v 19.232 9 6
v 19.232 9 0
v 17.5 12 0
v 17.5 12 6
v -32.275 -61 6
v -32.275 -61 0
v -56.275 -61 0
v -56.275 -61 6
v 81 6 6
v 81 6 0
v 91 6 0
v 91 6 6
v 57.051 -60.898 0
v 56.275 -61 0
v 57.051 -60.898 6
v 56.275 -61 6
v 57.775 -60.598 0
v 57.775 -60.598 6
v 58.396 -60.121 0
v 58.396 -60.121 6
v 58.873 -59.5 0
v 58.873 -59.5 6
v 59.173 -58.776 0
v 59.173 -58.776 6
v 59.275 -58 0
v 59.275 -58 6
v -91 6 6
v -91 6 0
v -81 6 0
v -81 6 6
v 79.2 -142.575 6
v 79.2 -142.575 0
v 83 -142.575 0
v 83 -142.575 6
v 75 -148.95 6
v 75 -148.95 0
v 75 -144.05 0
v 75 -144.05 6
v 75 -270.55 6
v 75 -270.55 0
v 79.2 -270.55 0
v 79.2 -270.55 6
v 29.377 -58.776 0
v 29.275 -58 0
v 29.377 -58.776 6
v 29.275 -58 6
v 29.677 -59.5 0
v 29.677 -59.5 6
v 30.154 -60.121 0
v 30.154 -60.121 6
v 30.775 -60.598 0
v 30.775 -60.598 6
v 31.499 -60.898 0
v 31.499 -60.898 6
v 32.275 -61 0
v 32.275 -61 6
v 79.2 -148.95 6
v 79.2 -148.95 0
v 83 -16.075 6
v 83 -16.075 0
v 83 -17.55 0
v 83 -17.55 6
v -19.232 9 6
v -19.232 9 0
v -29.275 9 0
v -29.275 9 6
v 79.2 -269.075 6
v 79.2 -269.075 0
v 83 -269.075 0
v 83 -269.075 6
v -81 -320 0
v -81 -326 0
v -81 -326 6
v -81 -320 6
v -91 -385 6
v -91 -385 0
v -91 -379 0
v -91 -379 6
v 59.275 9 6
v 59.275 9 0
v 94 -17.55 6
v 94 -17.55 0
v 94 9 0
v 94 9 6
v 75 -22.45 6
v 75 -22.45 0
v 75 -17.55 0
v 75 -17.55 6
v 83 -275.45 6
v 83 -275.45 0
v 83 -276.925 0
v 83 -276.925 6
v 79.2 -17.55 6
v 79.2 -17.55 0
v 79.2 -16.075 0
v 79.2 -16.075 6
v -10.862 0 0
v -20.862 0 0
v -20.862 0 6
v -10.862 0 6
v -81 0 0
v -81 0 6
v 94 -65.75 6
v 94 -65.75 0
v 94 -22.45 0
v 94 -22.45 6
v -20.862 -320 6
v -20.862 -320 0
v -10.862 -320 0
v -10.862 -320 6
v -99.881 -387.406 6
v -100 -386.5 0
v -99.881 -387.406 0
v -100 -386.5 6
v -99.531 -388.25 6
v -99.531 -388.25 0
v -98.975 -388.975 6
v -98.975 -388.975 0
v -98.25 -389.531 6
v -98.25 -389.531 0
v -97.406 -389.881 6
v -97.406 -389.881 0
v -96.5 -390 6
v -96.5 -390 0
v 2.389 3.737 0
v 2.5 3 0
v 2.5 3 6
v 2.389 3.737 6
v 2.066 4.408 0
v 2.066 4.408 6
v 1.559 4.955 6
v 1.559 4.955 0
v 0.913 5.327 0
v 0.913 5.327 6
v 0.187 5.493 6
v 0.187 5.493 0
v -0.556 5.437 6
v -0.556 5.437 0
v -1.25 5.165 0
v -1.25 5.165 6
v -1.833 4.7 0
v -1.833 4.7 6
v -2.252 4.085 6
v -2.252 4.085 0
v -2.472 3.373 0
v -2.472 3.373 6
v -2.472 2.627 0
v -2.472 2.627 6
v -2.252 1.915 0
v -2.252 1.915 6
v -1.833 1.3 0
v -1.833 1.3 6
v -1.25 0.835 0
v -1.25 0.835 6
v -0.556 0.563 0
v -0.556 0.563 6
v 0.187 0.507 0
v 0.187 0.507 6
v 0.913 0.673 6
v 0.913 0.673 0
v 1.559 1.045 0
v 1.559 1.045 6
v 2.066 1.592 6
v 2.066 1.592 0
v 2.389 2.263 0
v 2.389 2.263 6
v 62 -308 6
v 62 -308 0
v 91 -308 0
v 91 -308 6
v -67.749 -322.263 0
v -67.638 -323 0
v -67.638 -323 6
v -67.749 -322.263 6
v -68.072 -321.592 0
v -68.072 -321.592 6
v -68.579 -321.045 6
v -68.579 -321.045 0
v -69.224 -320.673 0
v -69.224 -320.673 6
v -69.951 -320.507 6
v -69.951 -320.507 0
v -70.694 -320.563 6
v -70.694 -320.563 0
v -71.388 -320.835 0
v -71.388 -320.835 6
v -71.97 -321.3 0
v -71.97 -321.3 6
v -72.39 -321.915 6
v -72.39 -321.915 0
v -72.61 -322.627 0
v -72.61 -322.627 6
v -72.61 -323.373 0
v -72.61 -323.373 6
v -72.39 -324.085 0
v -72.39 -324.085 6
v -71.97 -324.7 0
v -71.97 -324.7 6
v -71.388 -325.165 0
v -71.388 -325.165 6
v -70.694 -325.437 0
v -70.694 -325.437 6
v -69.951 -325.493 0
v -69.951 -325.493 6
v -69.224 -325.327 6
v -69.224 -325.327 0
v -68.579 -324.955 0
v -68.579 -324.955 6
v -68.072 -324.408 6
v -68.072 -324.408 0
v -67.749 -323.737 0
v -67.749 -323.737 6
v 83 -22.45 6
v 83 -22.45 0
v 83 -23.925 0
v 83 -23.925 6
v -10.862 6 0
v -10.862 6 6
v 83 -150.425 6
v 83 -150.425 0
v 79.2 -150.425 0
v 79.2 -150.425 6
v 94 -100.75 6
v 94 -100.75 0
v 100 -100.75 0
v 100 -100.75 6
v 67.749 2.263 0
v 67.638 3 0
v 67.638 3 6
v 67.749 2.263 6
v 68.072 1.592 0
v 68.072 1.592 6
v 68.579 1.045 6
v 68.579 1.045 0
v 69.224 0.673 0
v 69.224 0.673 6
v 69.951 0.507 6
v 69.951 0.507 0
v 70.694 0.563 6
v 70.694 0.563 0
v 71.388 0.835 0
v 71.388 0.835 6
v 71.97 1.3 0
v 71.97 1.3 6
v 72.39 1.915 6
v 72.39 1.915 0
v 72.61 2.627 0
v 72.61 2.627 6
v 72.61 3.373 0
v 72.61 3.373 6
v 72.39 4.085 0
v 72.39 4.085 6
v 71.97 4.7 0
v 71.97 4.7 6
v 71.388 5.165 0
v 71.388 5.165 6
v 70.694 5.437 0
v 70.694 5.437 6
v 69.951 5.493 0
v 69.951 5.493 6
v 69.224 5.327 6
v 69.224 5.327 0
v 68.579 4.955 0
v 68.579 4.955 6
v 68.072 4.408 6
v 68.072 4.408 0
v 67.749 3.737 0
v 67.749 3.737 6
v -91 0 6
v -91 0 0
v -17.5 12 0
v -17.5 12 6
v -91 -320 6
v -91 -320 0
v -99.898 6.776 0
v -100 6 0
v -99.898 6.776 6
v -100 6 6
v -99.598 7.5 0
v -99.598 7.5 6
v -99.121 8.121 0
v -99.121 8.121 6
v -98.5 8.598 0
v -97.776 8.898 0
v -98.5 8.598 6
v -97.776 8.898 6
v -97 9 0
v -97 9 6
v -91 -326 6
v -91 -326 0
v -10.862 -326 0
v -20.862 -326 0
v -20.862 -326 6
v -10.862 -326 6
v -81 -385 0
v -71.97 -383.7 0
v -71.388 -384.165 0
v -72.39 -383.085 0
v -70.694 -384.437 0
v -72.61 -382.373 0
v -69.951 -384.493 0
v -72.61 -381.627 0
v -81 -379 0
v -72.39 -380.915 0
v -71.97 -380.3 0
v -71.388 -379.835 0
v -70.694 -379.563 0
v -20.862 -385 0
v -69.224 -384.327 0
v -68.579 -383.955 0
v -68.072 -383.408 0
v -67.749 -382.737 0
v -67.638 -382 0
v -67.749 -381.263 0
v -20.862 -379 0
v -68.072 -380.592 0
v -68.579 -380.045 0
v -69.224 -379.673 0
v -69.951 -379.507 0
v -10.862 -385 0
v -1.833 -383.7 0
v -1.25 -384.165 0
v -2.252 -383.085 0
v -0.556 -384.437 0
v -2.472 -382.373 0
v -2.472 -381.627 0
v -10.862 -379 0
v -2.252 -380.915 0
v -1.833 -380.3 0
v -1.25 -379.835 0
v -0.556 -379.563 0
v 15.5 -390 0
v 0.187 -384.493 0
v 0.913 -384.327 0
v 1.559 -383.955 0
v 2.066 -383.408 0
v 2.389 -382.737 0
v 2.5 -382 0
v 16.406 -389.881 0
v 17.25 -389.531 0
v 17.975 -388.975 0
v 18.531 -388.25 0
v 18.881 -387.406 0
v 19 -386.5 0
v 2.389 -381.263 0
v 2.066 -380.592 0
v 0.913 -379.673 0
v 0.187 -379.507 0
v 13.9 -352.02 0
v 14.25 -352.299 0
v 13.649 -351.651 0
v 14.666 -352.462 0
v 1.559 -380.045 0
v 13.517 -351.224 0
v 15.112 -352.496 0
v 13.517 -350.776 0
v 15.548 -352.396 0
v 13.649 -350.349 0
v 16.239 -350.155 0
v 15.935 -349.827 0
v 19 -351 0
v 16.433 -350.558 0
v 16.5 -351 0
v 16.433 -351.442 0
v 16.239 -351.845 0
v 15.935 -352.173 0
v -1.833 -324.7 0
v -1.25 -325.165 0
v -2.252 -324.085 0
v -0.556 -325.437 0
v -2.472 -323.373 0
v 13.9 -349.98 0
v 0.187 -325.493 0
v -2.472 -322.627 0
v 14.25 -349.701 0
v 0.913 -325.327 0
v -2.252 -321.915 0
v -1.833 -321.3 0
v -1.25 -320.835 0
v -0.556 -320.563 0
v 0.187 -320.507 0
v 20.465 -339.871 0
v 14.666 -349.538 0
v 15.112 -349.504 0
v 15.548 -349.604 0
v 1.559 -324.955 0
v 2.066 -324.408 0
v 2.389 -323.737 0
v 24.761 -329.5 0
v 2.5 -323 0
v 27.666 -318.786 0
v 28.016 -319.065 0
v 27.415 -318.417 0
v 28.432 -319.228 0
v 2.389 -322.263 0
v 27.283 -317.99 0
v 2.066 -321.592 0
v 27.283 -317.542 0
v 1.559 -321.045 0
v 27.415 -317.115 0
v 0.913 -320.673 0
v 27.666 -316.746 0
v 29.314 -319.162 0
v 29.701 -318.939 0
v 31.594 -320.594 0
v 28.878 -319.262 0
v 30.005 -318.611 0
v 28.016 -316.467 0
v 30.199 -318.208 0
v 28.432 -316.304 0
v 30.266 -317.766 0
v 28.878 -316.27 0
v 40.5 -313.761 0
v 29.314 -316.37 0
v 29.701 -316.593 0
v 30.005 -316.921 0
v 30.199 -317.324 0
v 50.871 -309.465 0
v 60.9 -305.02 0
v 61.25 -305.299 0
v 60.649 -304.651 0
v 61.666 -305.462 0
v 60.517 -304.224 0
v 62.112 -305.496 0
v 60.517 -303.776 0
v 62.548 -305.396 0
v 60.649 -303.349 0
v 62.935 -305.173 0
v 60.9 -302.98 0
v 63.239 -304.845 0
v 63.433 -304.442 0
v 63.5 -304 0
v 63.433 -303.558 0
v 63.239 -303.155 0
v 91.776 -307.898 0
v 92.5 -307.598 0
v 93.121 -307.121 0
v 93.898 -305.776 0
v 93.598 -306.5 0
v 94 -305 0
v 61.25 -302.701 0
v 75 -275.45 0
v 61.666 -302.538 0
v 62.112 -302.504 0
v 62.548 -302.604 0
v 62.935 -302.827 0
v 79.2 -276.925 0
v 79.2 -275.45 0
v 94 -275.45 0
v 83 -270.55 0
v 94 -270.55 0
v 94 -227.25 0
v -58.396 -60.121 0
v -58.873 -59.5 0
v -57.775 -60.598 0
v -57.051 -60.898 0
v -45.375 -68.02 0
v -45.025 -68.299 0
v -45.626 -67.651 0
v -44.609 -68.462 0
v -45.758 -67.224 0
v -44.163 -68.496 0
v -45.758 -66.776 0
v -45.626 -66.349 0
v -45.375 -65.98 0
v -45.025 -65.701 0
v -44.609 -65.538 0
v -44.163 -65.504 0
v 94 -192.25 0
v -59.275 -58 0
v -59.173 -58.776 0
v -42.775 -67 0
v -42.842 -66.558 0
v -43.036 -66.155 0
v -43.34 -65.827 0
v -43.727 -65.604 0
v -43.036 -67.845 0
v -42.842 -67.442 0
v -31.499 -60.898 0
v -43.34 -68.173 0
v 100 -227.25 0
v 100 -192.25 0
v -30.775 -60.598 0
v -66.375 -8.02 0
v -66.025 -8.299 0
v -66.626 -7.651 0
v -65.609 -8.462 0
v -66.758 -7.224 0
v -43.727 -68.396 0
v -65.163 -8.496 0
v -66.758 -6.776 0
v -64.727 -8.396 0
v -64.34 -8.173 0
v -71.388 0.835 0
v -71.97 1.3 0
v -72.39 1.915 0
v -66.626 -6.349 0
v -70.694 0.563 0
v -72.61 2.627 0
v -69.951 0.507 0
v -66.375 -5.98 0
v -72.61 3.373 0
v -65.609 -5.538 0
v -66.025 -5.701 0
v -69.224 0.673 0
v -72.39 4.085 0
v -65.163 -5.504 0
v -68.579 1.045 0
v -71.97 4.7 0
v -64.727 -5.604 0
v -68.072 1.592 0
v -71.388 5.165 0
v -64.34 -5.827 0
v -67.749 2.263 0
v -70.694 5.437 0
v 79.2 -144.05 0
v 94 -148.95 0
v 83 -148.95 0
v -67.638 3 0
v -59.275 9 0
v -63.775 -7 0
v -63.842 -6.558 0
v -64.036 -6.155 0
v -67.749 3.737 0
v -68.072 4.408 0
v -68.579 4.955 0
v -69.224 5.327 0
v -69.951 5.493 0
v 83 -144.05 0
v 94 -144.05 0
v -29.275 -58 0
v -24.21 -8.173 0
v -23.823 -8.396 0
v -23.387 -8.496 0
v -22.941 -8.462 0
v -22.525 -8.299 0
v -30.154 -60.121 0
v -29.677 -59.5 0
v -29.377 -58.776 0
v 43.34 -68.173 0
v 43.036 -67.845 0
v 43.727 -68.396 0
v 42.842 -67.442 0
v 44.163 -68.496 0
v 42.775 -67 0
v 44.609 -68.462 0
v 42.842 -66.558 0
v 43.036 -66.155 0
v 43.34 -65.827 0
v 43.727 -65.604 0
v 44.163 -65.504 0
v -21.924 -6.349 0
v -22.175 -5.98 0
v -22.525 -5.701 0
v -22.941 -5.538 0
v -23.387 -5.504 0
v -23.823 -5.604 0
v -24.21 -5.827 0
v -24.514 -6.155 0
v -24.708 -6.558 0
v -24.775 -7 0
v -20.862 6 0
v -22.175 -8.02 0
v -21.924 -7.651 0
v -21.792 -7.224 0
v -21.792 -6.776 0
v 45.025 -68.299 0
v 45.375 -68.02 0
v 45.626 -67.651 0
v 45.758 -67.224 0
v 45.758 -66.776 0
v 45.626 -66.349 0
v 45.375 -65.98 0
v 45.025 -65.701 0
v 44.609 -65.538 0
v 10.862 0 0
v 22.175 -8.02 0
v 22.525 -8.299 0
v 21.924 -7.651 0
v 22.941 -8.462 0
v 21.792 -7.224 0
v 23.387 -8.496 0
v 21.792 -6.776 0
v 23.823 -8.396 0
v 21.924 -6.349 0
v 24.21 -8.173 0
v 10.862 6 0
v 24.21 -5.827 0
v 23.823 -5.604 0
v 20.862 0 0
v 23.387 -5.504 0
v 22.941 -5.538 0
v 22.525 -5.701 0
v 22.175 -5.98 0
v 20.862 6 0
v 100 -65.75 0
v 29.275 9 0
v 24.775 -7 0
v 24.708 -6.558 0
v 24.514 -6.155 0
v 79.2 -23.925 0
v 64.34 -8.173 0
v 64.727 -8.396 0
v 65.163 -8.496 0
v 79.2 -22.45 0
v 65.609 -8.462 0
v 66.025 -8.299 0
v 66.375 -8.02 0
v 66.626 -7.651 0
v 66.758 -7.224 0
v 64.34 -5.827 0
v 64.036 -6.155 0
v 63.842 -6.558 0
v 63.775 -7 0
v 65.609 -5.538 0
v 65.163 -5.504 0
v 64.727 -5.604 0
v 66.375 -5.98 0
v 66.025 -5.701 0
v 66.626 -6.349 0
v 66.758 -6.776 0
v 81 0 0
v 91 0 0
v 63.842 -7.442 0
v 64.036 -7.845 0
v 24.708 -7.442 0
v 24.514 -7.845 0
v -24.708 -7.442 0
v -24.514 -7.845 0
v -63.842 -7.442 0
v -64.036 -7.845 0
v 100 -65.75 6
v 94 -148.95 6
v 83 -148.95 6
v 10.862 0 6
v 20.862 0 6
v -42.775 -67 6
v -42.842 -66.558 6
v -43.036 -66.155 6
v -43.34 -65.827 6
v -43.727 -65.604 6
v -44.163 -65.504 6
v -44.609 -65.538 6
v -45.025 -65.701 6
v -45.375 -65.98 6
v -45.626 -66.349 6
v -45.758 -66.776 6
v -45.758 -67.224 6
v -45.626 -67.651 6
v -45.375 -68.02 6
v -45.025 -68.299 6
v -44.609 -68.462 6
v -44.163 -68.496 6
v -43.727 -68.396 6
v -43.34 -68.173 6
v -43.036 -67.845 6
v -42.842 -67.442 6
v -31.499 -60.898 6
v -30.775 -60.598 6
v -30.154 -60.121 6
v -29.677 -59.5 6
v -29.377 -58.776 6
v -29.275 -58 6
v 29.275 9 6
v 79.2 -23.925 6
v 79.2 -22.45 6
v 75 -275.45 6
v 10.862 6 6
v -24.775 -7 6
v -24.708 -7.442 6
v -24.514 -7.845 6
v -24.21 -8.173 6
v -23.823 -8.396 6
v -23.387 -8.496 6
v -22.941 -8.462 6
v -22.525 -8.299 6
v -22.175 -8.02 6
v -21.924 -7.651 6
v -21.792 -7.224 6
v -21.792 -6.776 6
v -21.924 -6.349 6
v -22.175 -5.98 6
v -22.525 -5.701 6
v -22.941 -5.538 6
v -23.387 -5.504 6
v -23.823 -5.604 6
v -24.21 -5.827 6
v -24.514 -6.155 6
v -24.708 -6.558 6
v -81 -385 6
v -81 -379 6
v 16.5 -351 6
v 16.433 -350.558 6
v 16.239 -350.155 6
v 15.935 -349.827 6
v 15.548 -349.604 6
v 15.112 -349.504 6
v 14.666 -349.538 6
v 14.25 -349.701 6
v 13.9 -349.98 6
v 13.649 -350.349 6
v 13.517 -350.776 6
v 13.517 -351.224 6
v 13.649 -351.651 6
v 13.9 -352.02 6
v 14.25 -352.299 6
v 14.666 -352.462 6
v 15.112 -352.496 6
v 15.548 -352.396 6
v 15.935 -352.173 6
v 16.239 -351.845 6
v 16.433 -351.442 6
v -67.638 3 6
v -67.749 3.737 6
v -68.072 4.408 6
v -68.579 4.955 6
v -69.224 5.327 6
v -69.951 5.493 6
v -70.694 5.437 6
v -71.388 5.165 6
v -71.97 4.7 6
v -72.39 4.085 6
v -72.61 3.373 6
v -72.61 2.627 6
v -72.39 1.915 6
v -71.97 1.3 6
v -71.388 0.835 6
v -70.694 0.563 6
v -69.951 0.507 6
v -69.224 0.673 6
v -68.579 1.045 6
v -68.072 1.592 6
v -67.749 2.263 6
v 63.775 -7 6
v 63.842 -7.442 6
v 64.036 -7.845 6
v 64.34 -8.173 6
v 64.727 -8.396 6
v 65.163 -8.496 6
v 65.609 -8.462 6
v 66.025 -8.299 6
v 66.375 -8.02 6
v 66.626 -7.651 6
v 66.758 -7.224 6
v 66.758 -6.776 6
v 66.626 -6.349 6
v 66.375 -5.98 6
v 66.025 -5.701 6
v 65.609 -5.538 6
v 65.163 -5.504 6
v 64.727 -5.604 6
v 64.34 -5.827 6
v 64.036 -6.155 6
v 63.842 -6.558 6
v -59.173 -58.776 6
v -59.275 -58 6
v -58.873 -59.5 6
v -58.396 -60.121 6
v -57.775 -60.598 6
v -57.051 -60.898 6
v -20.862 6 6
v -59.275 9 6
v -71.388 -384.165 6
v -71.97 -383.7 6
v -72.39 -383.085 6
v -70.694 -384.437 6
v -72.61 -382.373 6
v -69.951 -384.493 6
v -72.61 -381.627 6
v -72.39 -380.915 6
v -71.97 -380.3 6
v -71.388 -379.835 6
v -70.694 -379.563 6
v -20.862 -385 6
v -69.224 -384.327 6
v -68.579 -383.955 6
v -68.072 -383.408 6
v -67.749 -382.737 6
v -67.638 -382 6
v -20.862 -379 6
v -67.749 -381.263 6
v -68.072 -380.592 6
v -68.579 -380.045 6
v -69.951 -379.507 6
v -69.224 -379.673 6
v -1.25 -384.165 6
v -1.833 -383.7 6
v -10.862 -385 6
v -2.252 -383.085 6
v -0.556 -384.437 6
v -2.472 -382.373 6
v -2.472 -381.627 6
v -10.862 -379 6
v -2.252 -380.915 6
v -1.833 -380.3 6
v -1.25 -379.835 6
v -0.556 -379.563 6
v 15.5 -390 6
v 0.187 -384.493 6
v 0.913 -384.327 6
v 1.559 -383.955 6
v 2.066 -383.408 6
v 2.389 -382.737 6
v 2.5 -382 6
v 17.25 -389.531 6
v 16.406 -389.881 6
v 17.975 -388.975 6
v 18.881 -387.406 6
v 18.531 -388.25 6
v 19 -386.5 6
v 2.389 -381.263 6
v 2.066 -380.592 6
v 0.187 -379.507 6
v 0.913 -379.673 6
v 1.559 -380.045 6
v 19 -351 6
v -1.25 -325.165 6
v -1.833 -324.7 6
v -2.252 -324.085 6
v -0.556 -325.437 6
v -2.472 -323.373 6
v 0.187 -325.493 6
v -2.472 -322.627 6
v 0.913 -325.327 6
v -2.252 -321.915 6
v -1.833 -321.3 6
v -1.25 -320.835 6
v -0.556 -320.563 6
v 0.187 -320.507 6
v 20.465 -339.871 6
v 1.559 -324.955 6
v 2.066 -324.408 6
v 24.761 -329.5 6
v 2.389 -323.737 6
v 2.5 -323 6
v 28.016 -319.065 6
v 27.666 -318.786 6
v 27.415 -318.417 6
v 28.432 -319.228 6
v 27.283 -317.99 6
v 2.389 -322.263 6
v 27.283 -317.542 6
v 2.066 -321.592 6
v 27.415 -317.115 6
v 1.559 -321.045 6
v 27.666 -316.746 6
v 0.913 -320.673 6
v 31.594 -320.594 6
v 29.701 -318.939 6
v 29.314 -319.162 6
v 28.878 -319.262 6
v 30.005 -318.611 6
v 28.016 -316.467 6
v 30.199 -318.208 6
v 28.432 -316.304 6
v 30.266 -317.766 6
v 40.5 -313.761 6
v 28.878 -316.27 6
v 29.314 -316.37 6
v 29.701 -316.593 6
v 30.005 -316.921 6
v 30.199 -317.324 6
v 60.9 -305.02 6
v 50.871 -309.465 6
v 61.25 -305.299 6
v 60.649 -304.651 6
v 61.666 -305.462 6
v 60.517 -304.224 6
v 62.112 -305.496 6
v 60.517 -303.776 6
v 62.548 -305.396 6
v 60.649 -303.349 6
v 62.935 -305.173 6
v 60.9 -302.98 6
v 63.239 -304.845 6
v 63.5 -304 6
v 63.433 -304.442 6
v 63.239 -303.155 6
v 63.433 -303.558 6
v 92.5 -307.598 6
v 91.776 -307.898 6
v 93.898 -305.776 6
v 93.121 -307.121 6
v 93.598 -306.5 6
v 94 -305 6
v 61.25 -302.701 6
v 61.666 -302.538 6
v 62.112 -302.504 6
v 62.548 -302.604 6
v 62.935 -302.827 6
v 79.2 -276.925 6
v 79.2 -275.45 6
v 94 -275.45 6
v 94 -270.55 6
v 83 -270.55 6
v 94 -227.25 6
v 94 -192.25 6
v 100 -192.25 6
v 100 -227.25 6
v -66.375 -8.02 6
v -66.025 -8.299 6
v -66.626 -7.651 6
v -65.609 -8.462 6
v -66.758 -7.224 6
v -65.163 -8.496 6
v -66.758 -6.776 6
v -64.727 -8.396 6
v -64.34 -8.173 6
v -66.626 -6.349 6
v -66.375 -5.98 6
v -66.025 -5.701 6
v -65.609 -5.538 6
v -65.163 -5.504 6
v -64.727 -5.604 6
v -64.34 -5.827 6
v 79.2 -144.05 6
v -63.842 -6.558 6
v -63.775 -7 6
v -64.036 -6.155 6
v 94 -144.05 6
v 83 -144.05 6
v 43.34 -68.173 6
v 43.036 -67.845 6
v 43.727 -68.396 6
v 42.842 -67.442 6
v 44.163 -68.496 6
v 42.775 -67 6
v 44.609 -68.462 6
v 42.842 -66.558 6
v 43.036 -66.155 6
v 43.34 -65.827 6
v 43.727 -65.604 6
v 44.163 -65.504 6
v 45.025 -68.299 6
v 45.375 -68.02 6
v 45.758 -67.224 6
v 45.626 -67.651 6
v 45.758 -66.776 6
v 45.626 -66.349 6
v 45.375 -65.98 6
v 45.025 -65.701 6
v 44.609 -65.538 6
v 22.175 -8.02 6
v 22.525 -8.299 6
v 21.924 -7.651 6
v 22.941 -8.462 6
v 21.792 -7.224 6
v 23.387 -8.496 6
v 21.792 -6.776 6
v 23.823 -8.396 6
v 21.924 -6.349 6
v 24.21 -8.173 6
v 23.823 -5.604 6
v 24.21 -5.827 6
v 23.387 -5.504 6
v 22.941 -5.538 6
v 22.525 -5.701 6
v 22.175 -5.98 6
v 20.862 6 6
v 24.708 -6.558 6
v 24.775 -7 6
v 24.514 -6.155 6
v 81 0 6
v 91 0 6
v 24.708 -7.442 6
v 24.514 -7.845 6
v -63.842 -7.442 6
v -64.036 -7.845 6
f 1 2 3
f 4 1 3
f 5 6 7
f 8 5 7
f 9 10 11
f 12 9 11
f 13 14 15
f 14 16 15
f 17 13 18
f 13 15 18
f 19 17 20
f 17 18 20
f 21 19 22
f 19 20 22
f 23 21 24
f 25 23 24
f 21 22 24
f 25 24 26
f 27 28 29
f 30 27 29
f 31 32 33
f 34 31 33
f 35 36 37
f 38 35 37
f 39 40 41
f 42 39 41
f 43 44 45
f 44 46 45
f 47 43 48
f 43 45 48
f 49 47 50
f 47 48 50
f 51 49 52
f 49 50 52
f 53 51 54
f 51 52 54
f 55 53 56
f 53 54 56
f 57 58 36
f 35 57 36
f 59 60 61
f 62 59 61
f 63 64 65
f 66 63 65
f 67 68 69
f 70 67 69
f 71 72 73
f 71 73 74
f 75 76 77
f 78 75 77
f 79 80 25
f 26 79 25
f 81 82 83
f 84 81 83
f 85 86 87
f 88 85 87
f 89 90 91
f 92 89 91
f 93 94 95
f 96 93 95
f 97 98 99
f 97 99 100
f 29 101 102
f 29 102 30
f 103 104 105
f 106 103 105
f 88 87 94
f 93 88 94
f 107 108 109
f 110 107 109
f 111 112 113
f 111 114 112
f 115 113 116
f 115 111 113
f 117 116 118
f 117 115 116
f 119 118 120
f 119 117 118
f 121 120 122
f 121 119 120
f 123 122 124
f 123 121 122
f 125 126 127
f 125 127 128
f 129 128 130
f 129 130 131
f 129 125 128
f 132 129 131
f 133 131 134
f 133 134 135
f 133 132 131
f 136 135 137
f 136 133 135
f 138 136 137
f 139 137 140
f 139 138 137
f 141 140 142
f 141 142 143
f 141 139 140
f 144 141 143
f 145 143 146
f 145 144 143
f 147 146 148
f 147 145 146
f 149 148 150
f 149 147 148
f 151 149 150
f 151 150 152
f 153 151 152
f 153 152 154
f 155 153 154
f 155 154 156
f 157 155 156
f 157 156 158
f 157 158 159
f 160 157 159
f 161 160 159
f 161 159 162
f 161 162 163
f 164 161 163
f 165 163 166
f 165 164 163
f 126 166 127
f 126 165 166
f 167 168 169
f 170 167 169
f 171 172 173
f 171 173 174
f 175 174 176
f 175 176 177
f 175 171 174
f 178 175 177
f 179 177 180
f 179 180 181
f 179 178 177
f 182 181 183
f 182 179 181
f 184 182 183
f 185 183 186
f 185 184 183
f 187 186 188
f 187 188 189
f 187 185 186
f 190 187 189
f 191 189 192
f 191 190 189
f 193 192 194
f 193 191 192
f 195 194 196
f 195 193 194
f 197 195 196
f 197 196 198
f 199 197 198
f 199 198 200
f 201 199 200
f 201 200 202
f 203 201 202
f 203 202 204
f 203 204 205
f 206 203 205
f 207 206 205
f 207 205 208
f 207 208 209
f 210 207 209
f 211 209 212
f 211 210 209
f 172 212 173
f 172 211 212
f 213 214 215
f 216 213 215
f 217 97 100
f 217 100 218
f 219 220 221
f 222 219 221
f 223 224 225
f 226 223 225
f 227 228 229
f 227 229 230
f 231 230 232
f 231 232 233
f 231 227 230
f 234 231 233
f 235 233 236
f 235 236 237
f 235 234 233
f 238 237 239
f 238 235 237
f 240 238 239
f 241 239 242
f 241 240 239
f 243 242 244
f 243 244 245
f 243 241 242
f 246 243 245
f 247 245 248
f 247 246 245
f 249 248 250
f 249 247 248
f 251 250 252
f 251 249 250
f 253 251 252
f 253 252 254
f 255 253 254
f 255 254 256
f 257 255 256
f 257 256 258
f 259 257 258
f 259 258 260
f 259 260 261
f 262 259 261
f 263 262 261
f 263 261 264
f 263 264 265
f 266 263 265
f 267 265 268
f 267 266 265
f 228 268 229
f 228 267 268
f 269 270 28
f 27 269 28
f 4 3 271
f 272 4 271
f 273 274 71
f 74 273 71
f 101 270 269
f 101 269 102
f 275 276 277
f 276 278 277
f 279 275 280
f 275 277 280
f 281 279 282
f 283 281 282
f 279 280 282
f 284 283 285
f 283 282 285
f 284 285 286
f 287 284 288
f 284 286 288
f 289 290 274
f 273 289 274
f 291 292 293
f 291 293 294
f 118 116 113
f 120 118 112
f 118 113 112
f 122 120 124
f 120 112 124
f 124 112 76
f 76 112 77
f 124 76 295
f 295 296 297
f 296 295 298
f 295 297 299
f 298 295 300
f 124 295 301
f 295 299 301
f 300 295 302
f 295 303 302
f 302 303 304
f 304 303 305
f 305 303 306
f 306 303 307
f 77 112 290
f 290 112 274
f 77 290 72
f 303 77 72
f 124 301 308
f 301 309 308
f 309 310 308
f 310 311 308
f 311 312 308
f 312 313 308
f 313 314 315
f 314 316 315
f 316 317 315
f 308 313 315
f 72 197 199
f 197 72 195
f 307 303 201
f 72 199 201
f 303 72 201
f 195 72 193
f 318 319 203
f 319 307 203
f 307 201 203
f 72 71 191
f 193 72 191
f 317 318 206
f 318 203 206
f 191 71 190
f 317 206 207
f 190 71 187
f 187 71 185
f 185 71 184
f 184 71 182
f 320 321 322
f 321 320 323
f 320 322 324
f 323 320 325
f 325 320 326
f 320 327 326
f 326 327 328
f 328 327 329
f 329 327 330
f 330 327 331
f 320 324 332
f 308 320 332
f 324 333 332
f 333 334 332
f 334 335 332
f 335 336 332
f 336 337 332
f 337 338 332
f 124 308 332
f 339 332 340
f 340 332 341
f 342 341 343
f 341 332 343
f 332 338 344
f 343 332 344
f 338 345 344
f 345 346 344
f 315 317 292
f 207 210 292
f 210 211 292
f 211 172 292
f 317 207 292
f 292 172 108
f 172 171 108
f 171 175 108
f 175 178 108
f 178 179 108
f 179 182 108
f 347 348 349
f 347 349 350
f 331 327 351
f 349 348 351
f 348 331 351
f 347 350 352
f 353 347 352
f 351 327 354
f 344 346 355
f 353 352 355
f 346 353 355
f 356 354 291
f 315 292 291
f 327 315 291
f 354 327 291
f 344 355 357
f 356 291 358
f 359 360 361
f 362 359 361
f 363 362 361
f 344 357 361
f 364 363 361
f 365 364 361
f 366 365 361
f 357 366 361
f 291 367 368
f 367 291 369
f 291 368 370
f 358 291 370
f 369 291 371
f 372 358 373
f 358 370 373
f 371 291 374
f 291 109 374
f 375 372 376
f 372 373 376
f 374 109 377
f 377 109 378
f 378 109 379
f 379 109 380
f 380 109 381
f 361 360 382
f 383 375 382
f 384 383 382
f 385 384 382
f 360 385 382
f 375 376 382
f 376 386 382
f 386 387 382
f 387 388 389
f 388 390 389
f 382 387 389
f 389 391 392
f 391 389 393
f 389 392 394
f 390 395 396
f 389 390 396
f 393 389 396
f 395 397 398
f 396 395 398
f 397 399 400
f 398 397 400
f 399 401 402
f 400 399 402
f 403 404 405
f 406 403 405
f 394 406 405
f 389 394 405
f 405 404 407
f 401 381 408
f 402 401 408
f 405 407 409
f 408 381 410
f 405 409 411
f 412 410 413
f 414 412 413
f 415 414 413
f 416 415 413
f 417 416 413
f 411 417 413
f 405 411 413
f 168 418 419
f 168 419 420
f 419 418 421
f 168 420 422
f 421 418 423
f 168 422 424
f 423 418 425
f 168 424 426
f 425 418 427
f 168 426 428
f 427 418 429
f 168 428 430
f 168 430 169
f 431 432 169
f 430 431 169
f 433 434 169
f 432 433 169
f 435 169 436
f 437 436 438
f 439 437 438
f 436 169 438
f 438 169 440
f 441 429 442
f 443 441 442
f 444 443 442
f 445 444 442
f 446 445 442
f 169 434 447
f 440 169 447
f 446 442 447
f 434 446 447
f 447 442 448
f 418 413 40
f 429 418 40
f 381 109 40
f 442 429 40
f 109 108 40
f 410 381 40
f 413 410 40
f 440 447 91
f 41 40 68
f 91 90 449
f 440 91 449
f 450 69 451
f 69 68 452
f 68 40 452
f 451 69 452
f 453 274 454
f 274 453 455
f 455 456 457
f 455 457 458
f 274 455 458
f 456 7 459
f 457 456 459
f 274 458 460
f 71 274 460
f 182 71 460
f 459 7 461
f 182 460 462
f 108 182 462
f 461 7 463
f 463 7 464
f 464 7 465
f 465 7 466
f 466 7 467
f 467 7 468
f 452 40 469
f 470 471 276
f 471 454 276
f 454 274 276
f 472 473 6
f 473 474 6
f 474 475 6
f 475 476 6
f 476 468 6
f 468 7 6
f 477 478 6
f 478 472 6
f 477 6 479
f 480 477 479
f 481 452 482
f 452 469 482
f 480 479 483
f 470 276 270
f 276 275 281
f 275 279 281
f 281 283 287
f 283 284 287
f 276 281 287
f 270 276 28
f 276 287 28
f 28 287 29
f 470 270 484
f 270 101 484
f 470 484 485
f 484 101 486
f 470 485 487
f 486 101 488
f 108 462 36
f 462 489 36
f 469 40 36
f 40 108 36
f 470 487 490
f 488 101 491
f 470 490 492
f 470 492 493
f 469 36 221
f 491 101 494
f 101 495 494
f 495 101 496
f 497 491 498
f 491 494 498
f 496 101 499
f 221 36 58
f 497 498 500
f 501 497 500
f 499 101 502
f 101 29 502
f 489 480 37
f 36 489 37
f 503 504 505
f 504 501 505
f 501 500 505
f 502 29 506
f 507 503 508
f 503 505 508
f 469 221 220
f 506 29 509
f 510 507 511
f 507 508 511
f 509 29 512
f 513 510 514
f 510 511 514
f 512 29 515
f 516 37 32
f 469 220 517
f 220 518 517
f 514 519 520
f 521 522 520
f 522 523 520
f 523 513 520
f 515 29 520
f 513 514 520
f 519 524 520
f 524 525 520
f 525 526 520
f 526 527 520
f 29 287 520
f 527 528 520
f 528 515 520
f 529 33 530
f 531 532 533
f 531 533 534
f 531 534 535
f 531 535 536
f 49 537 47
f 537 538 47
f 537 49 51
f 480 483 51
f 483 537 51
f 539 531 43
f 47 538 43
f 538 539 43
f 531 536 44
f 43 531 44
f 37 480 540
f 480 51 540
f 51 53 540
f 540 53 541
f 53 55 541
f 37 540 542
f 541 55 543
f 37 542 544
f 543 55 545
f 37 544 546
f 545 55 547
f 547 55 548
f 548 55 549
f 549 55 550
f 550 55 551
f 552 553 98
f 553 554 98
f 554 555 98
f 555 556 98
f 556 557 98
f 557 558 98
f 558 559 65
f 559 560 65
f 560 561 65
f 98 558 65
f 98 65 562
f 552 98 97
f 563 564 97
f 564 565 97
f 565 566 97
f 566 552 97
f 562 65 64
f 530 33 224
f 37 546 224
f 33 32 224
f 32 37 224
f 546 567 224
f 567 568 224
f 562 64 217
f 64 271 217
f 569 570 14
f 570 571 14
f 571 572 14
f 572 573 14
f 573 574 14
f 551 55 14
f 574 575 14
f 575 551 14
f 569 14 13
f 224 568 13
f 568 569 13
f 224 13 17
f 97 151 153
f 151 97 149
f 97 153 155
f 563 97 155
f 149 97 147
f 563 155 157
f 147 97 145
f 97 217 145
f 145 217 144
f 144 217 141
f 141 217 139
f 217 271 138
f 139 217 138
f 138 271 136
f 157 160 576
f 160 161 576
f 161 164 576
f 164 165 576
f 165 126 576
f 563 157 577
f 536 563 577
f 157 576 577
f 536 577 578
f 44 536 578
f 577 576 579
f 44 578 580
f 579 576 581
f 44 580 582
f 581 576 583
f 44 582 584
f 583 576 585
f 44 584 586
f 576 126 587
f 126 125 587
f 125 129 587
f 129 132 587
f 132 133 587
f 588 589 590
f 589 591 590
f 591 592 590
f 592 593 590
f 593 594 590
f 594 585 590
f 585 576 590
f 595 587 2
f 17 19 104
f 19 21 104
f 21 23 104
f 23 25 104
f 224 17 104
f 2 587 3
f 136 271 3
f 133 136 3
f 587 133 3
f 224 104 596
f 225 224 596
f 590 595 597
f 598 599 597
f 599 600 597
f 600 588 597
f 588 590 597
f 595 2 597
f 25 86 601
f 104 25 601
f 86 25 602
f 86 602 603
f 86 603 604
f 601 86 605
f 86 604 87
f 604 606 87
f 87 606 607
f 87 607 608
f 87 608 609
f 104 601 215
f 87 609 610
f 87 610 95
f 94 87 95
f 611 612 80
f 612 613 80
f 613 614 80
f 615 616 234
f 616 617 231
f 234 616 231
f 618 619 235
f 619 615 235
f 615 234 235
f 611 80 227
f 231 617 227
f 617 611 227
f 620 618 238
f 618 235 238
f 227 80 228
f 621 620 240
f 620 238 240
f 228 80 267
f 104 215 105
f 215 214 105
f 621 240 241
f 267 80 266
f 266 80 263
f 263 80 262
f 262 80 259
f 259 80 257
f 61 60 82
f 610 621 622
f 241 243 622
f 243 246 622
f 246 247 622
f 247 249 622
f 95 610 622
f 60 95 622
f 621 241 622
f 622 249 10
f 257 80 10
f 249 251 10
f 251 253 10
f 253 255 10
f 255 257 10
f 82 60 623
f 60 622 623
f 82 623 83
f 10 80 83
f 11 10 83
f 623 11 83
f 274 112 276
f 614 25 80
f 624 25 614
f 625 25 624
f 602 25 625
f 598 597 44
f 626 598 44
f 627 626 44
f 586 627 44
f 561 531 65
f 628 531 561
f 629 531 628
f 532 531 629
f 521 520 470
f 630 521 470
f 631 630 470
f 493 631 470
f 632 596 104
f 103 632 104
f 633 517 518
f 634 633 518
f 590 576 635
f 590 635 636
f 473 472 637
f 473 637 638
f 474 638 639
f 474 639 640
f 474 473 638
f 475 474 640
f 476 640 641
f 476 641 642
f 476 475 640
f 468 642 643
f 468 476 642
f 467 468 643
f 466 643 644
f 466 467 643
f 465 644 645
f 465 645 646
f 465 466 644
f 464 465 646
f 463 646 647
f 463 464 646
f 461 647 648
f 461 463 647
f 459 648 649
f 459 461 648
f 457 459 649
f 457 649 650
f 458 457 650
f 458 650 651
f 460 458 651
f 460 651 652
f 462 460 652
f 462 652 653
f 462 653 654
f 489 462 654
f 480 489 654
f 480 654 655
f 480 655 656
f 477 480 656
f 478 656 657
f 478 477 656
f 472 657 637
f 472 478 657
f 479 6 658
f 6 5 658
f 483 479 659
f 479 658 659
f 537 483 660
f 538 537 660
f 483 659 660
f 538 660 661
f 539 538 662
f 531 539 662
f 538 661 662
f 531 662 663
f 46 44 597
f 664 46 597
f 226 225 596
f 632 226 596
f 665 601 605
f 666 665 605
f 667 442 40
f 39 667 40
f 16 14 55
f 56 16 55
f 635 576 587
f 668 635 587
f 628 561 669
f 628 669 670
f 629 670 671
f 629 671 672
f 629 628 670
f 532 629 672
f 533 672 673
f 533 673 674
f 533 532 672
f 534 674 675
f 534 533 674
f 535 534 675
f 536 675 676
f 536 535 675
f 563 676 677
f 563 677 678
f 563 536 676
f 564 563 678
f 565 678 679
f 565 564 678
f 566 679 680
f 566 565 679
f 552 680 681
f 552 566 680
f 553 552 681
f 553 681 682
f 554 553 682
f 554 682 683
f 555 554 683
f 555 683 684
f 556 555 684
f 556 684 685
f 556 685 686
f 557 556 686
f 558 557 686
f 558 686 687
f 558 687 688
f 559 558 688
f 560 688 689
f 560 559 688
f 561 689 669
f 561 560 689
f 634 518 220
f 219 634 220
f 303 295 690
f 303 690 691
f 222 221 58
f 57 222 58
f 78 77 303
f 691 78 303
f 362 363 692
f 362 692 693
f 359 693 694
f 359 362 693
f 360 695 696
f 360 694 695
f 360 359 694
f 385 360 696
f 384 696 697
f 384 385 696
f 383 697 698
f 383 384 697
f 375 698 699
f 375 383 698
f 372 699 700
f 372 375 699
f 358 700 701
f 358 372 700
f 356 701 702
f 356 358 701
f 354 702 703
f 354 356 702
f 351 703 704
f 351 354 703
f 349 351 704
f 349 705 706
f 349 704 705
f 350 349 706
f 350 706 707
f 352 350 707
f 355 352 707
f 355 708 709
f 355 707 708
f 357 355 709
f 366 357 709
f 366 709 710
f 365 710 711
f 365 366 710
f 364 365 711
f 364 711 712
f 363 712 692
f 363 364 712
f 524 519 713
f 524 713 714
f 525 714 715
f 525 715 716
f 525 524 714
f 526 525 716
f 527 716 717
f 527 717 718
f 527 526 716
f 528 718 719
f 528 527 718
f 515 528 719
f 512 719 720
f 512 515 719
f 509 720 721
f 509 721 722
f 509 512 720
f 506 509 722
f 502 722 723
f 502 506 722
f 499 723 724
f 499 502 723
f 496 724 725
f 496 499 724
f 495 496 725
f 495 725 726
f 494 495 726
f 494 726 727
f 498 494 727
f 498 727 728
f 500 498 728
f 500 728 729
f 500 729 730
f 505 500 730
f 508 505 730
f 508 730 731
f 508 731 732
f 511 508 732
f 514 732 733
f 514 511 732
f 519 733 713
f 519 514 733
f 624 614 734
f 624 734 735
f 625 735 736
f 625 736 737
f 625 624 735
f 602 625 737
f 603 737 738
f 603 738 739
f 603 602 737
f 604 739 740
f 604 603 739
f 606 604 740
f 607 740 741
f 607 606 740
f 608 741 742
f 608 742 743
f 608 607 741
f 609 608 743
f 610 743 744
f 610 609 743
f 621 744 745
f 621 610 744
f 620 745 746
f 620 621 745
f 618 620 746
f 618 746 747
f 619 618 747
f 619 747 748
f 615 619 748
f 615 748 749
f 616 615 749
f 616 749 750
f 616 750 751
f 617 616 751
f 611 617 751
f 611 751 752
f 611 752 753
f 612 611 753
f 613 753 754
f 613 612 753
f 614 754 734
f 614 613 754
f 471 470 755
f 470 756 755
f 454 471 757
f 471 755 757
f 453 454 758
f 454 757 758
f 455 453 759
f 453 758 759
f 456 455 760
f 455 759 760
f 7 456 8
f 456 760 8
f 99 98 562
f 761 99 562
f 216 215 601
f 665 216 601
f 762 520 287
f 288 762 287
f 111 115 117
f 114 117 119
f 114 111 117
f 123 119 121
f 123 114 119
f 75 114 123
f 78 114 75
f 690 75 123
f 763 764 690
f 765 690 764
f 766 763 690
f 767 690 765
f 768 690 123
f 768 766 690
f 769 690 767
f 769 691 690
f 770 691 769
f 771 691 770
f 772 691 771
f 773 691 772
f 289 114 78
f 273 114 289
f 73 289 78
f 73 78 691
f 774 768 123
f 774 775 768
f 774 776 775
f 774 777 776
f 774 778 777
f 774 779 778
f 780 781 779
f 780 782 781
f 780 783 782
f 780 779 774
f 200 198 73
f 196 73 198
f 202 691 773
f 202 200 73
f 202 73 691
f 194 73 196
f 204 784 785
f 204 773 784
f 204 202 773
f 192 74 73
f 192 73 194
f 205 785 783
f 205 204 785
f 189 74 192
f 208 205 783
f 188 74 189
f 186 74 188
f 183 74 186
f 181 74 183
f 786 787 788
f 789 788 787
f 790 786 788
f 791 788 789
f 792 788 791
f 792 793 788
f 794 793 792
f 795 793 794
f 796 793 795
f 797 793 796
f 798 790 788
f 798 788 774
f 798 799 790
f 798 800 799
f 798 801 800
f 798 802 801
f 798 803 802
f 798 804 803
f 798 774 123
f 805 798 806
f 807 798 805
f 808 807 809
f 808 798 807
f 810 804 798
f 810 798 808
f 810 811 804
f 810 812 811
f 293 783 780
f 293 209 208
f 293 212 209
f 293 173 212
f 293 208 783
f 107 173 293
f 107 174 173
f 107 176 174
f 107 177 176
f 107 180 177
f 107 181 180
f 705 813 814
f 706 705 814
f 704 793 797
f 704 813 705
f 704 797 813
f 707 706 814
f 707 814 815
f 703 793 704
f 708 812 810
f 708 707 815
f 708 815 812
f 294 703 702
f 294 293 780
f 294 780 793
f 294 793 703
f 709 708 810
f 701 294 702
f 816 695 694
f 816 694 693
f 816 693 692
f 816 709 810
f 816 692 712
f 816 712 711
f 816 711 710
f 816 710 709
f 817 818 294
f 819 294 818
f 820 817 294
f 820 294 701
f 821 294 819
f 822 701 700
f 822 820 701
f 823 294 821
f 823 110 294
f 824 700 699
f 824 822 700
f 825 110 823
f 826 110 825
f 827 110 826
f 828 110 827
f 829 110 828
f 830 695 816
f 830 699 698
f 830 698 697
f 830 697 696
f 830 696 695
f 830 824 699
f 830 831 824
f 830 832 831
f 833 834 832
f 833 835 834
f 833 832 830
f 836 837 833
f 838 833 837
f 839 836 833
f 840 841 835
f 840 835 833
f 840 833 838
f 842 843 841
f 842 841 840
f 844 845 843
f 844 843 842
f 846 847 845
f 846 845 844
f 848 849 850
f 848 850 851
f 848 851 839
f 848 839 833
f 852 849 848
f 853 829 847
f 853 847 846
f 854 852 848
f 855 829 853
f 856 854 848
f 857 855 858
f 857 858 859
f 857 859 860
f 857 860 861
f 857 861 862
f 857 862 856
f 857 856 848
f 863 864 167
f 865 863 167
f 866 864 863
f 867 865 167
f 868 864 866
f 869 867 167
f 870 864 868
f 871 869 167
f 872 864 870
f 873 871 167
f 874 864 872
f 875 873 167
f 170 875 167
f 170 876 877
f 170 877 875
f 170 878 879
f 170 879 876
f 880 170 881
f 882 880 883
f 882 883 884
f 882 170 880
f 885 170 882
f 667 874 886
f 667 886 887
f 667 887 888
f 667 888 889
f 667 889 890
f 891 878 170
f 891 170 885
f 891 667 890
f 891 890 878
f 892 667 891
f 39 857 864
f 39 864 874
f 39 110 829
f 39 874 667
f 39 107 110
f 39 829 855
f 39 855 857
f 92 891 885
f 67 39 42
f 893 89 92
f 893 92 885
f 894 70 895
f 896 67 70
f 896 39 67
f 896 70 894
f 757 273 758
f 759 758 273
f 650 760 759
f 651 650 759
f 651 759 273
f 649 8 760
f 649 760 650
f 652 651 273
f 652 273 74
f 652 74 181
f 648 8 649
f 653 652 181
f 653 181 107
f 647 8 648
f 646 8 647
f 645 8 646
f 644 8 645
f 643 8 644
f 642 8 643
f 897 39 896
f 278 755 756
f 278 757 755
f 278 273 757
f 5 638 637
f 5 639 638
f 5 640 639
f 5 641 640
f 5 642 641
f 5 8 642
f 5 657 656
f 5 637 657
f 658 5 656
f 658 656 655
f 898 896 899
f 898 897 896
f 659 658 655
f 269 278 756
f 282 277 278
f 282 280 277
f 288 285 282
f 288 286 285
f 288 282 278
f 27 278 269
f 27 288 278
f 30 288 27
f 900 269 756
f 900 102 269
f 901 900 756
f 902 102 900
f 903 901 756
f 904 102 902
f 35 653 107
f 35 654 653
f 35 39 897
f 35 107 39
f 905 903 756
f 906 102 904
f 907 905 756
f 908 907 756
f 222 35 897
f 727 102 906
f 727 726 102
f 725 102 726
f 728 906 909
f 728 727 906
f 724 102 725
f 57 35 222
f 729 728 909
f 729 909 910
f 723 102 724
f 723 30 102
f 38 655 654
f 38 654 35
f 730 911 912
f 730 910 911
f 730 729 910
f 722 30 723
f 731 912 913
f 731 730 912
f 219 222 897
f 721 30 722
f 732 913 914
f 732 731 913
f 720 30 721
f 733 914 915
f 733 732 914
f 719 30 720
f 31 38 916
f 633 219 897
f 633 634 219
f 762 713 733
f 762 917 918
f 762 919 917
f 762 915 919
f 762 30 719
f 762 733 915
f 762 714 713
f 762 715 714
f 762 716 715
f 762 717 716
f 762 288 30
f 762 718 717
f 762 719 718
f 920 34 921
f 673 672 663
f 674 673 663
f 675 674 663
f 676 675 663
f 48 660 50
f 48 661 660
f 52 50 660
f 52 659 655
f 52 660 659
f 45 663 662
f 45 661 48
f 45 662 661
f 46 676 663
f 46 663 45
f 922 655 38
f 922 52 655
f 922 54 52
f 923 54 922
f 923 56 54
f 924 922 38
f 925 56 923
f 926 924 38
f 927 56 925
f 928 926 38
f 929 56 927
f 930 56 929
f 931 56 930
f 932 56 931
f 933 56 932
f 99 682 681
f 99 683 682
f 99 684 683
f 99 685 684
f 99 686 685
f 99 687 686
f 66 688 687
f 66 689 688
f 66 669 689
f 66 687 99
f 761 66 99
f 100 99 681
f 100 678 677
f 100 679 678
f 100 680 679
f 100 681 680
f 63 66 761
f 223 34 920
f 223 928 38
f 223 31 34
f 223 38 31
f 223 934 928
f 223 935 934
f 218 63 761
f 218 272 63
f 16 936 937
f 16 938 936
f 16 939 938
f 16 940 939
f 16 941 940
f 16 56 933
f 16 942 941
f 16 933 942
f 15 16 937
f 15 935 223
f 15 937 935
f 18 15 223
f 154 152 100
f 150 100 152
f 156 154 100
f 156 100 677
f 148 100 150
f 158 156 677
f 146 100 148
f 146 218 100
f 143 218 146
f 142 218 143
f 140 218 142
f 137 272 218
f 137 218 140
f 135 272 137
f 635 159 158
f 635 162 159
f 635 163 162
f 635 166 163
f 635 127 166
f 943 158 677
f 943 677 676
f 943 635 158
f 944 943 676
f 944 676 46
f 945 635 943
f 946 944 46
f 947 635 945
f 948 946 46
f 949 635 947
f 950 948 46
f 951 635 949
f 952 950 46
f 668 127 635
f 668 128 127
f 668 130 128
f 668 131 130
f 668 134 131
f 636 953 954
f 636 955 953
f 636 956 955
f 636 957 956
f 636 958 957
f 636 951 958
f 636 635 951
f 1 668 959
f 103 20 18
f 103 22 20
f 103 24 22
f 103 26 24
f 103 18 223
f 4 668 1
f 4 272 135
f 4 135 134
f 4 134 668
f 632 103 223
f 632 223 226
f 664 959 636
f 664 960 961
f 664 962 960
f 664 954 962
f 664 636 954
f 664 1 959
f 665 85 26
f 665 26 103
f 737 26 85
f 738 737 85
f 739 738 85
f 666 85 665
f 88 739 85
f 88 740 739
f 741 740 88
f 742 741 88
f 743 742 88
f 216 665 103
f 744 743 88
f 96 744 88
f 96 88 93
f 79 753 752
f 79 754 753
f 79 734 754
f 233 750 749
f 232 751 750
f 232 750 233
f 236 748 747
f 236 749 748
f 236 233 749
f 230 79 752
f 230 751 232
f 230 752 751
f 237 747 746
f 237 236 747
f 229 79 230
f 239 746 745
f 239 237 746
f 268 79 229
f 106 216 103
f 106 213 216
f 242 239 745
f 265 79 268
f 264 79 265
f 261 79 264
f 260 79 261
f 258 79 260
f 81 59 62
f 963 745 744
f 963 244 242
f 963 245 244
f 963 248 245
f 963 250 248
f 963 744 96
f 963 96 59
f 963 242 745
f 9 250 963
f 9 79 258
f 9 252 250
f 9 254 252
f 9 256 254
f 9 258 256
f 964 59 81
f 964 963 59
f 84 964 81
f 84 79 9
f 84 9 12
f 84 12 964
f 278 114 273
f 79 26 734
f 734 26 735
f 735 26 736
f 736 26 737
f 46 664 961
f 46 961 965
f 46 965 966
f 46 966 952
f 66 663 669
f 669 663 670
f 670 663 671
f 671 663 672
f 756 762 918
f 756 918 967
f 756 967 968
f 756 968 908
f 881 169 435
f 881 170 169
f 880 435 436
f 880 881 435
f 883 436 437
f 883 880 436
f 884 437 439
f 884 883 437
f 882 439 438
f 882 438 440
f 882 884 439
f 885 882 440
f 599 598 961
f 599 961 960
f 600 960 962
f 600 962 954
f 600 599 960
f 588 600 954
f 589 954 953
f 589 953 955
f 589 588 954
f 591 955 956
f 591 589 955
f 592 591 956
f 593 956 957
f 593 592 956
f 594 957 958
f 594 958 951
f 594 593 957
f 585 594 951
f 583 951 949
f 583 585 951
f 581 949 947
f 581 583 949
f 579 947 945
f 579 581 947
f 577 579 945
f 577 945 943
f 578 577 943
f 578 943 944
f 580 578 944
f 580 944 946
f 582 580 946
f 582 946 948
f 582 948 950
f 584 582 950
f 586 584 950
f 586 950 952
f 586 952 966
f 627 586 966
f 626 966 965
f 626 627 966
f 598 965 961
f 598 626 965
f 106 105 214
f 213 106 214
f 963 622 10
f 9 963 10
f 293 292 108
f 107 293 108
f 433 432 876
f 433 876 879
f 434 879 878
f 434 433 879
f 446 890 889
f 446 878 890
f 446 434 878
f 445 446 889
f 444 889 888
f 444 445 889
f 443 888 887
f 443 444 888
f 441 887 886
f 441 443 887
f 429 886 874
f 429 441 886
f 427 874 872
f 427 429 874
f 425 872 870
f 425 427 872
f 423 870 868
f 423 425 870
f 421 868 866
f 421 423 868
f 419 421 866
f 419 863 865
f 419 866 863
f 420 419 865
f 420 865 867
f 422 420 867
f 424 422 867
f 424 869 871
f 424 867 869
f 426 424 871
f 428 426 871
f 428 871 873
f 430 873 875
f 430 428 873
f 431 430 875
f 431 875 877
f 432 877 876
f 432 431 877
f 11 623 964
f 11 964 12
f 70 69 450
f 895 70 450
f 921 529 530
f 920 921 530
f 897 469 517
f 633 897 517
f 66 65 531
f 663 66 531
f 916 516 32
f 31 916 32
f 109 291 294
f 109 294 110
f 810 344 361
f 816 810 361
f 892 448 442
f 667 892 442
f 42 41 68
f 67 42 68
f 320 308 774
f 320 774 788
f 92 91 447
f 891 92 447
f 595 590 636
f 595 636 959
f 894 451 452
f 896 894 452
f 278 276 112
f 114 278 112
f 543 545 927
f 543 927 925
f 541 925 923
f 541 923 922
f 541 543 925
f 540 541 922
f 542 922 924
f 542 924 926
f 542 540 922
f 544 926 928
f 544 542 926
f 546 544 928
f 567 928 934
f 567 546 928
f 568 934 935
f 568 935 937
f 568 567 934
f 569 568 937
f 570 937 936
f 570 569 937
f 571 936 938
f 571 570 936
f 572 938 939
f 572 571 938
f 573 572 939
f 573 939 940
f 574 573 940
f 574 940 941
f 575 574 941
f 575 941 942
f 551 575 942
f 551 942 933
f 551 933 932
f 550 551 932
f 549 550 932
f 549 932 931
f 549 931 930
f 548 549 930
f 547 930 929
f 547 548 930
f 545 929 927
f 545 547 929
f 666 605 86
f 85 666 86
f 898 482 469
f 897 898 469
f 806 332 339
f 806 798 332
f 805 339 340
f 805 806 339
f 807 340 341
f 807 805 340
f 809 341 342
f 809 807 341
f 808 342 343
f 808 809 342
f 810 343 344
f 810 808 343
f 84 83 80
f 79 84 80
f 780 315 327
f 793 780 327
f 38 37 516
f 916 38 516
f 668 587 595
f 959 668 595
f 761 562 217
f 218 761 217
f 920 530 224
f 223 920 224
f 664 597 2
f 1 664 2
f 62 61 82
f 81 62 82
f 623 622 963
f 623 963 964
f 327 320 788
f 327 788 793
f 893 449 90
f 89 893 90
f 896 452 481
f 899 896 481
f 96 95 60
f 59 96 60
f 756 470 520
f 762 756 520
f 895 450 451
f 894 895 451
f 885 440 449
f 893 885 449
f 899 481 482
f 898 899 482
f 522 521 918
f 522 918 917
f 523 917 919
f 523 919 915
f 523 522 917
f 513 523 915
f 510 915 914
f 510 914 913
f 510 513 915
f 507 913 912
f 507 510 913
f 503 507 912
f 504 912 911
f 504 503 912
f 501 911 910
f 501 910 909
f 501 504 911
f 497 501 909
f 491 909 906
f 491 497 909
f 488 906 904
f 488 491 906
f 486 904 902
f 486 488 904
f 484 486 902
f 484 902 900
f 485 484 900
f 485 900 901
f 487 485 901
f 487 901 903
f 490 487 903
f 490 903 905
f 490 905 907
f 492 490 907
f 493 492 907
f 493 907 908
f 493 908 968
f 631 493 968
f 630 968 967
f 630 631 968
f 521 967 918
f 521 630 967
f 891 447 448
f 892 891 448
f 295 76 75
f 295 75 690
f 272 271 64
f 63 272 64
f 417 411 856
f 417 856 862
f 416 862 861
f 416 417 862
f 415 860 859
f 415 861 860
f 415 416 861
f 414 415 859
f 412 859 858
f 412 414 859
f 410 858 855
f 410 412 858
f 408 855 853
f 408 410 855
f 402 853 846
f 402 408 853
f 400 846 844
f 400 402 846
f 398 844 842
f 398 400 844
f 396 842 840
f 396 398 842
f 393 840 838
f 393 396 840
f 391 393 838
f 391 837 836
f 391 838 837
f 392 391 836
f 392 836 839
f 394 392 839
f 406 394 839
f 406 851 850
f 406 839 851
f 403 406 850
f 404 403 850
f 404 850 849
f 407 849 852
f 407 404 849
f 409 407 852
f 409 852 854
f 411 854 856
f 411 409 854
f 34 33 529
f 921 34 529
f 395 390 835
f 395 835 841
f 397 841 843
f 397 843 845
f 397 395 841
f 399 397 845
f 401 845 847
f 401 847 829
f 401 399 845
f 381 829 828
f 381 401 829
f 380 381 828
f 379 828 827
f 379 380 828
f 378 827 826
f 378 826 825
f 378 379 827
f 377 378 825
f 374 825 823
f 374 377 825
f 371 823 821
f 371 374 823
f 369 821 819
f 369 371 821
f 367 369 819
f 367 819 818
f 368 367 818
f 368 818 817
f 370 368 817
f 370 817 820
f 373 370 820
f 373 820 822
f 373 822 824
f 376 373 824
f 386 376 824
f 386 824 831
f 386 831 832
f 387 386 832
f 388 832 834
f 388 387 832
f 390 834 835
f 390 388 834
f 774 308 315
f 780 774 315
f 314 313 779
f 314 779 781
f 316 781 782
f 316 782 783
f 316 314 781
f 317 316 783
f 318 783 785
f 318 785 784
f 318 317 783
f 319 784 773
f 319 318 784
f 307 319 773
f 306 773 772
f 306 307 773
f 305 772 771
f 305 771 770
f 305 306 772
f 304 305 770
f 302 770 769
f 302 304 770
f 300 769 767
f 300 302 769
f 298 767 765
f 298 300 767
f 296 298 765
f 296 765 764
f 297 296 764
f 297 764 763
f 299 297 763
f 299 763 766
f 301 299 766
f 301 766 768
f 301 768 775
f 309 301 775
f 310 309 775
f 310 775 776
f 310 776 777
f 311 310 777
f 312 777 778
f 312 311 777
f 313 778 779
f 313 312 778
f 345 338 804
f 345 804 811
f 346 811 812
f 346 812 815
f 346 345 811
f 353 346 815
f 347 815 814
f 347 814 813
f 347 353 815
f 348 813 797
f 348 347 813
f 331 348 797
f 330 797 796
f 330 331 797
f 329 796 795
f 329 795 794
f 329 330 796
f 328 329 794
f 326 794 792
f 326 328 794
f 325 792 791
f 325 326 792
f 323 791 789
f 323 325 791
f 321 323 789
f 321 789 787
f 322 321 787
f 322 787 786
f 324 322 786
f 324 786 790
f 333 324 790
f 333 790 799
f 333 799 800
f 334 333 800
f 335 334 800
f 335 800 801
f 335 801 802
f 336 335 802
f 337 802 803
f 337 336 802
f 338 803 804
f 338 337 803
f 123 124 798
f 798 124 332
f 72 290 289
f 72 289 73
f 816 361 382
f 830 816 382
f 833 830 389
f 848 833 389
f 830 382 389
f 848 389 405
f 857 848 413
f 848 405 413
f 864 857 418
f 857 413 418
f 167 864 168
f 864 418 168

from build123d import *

# Parameters (mm, degrees)
SKETCH_1_R               = 2.5
SKETCH_1_R_2             = 1.5
SKETCH_1_W               = 10
SKETCH_1_H               = 6
EXTRUDE_1_DEPTH          = 6
FILLET_1_R               = 3.5
FILLET_2_R               = 3
CUT_EXTRUDE_1_DEPTH      = 403.661147865
CUT_EXTRUDE_1_DEPTH_BACK = 403.661147865
SKETCH_2_R               = 1.5


with BuildPart() as part:
    # Эскиз1 → Бобышка-Вытянуть1 (new body)
    with BuildSketch(Plane.XY):
        with BuildLine():
            Line((94, -65.75), (94, -22.45))
            Line((94, -22.45), (83, -22.45))
            Line((83, -22.45), (83, -23.925))
            Line((83, -23.925), (79.2, -23.925))
            Line((79.2, -23.925), (79.2, -22.45))
            Line((79.2, -22.45), (75, -22.45))
            Line((75, -22.45), (75, -17.55))
            Line((75, -17.55), (79.2, -17.55))
            Line((79.2, -17.55), (79.2, -16.075))
            Line((79.2, -16.075), (83, -16.075))
            Line((83, -16.075), (83, -17.55))
            Line((83, -17.55), (94, -17.55))
            Line((94, -17.55), (94, 9))
            Line((94, 9), (59.275, 9))
            Line((59.275, 9), (59.275, -61))
            Line((59.275, -61), (29.275, -61))
            Line((29.275, -61), (29.275, 9))
            Line((29.275, 9), (19.232050808, 9))
            Line((19.232050808, 9), (17.5, 12))
            Line((17.5, 12), (-17.5, 12))
            Line((-17.5, 12), (-19.232050808, 9))
            Line((-19.232050808, 9), (-29.275, 9))
            Line((-29.275, 9), (-29.275, -61))
            Line((-29.275, -61), (-59.275, -61))
            Line((-59.275, -61), (-59.275, 9))
            Line((-59.275, 9), (-100, 9))
            Line((-100, 9), (-100, -390))
            Line((-100, -390), (19, -390))
            Line((19, -390), (19, -351))
            ThreePointArc((19, -351), (31.594408409, -320.594408409), (62, -308))
            Line((62, -308), (94, -308))
            Line((94, -308), (94, -275.45))
            Line((94, -275.45), (83, -275.45))
            Line((83, -275.45), (83, -276.925))
            Line((83, -276.925), (79.2, -276.925))
            Line((79.2, -276.925), (79.2, -275.45))
            Line((79.2, -275.45), (75, -275.45))
            Line((75, -275.45), (75, -270.55))
            Line((75, -270.55), (79.2, -270.55))
            Line((79.2, -270.55), (79.2, -269.075))
            Line((79.2, -269.075), (83, -269.075))
            Line((83, -269.075), (83, -270.55))
            Line((83, -270.55), (94, -270.55))
            Line((94, -270.55), (94, -227.25))
            Line((94, -227.25), (100, -227.25))
            Line((100, -227.25), (100, -192.25))
            Line((100, -192.25), (94, -192.25))
            Line((94, -192.25), (94, -148.95))
            Line((94, -148.95), (83, -148.95))
            Line((83, -148.95), (83, -150.425))
            Line((83, -150.425), (79.2, -150.425))
            Line((79.2, -150.425), (79.2, -148.95))
            Line((79.2, -148.95), (75, -148.95))
            Line((75, -148.95), (75, -144.05))
            Line((75, -144.05), (79.2, -144.05))
            Line((79.2, -144.05), (79.2, -142.575))
            Line((79.2, -142.575), (83, -142.575))
            Line((83, -142.575), (83, -144.05))
            Line((83, -144.05), (94, -144.05))
            Line((94, -144.05), (94, -100.75))
            Line((94, -100.75), (100, -100.75))
            Line((100, -100.75), (100, -65.75))
            Line((100, -65.75), (94, -65.75))
        make_face()
        with Locations((-70.1375, 3)):
            Circle(SKETCH_1_R, mode=Mode.SUBTRACT)
        with Locations((0, 3)):
            Circle(SKETCH_1_R, mode=Mode.SUBTRACT)
        with Locations(Location((70.1375, 3, 0), (0, 0, 180))):
            Circle(SKETCH_1_R, mode=Mode.SUBTRACT)
        with Locations((-70.1375, -382)):
            Circle(SKETCH_1_R, mode=Mode.SUBTRACT)
        with Locations((0, -382)):
            Circle(SKETCH_1_R, mode=Mode.SUBTRACT)
        with Locations((-70.1375, -323)):
            Circle(SKETCH_1_R, mode=Mode.SUBTRACT)
        with Locations((0, -323)):
            Circle(SKETCH_1_R, mode=Mode.SUBTRACT)
        with Locations((-44.275, -67)):
            Circle(SKETCH_1_R_2, mode=Mode.SUBTRACT)
        with Locations((-65.275, -7)):
            Circle(SKETCH_1_R_2, mode=Mode.SUBTRACT)
        with Locations(Location((-23.275, -7, 0), (0, 0, 180))):
            Circle(SKETCH_1_R_2, mode=Mode.SUBTRACT)
        with Locations(Location((44.275, -67, 0), (0, 0, 180))):
            Circle(SKETCH_1_R_2, mode=Mode.SUBTRACT)
        with Locations((23.275, -7)):
            Circle(SKETCH_1_R_2, mode=Mode.SUBTRACT)
        with Locations(Location((65.275, -7, 0), (0, 0, 180))):
            Circle(SKETCH_1_R_2, mode=Mode.SUBTRACT)
        with Locations((15.8625, 3)):
            Rectangle(SKETCH_1_W, SKETCH_1_H, mode=Mode.SUBTRACT)
        with Locations((-15.8625, 3)):
            Rectangle(SKETCH_1_W, SKETCH_1_H, mode=Mode.SUBTRACT)
        with Locations((-86, 3)):
            Rectangle(SKETCH_1_W, SKETCH_1_H, mode=Mode.SUBTRACT)
        with Locations((86, 3)):
            Rectangle(SKETCH_1_W, SKETCH_1_H, mode=Mode.SUBTRACT)
        with Locations((-86, -382)):
            Rectangle(SKETCH_1_W, SKETCH_1_H, mode=Mode.SUBTRACT)
        with Locations((-15.8625, -382)):
            Rectangle(SKETCH_1_W, SKETCH_1_H, mode=Mode.SUBTRACT)
        with Locations((-86, -323)):
            Rectangle(SKETCH_1_W, SKETCH_1_H, mode=Mode.SUBTRACT)
        with Locations((-15.8625, -323)):
            Rectangle(SKETCH_1_W, SKETCH_1_H, mode=Mode.SUBTRACT)
    extrude(amount=EXTRUDE_1_DEPTH)

    # Скругление1
    fillet_1_edges = [part.edges().sort_by_distance(p)[0] for p in [
        (19, -390, 3),
        (-100, -390, 3),
    ]]
    fillet(fillet_1_edges, radius=FILLET_1_R)

    # Скругление2
    fillet_2_edges = [part.edges().sort_by_distance(p)[0] for p in [
        (94, -308, 3),
        (-100, 9, 3),
        (-59.275, -61, 3),
        (-29.275, -61, 3),
        (29.275, -61, 3),
        (59.275, -61, 3),
    ]]
    fillet(fillet_2_edges, radius=FILLET_2_R)

    # Эскиз2 → Вырез-Вытянуть1 (cut, two sides: drawn at the far end of the back side and taken through both)
    with BuildSketch(Plane.XY.offset(6).offset(-CUT_EXTRUDE_1_DEPTH_BACK)):
        with Locations((15, -351)):
            Circle(SKETCH_2_R)
        with Locations((28.765981284, -317.765981284)):
            Circle(SKETCH_2_R)
        with Locations((62, -304)):
            Circle(SKETCH_2_R)
    extrude(amount=CUT_EXTRUDE_1_DEPTH + CUT_EXTRUDE_1_DEPTH_BACK, mode=Mode.SUBTRACT)


solid = part.part
